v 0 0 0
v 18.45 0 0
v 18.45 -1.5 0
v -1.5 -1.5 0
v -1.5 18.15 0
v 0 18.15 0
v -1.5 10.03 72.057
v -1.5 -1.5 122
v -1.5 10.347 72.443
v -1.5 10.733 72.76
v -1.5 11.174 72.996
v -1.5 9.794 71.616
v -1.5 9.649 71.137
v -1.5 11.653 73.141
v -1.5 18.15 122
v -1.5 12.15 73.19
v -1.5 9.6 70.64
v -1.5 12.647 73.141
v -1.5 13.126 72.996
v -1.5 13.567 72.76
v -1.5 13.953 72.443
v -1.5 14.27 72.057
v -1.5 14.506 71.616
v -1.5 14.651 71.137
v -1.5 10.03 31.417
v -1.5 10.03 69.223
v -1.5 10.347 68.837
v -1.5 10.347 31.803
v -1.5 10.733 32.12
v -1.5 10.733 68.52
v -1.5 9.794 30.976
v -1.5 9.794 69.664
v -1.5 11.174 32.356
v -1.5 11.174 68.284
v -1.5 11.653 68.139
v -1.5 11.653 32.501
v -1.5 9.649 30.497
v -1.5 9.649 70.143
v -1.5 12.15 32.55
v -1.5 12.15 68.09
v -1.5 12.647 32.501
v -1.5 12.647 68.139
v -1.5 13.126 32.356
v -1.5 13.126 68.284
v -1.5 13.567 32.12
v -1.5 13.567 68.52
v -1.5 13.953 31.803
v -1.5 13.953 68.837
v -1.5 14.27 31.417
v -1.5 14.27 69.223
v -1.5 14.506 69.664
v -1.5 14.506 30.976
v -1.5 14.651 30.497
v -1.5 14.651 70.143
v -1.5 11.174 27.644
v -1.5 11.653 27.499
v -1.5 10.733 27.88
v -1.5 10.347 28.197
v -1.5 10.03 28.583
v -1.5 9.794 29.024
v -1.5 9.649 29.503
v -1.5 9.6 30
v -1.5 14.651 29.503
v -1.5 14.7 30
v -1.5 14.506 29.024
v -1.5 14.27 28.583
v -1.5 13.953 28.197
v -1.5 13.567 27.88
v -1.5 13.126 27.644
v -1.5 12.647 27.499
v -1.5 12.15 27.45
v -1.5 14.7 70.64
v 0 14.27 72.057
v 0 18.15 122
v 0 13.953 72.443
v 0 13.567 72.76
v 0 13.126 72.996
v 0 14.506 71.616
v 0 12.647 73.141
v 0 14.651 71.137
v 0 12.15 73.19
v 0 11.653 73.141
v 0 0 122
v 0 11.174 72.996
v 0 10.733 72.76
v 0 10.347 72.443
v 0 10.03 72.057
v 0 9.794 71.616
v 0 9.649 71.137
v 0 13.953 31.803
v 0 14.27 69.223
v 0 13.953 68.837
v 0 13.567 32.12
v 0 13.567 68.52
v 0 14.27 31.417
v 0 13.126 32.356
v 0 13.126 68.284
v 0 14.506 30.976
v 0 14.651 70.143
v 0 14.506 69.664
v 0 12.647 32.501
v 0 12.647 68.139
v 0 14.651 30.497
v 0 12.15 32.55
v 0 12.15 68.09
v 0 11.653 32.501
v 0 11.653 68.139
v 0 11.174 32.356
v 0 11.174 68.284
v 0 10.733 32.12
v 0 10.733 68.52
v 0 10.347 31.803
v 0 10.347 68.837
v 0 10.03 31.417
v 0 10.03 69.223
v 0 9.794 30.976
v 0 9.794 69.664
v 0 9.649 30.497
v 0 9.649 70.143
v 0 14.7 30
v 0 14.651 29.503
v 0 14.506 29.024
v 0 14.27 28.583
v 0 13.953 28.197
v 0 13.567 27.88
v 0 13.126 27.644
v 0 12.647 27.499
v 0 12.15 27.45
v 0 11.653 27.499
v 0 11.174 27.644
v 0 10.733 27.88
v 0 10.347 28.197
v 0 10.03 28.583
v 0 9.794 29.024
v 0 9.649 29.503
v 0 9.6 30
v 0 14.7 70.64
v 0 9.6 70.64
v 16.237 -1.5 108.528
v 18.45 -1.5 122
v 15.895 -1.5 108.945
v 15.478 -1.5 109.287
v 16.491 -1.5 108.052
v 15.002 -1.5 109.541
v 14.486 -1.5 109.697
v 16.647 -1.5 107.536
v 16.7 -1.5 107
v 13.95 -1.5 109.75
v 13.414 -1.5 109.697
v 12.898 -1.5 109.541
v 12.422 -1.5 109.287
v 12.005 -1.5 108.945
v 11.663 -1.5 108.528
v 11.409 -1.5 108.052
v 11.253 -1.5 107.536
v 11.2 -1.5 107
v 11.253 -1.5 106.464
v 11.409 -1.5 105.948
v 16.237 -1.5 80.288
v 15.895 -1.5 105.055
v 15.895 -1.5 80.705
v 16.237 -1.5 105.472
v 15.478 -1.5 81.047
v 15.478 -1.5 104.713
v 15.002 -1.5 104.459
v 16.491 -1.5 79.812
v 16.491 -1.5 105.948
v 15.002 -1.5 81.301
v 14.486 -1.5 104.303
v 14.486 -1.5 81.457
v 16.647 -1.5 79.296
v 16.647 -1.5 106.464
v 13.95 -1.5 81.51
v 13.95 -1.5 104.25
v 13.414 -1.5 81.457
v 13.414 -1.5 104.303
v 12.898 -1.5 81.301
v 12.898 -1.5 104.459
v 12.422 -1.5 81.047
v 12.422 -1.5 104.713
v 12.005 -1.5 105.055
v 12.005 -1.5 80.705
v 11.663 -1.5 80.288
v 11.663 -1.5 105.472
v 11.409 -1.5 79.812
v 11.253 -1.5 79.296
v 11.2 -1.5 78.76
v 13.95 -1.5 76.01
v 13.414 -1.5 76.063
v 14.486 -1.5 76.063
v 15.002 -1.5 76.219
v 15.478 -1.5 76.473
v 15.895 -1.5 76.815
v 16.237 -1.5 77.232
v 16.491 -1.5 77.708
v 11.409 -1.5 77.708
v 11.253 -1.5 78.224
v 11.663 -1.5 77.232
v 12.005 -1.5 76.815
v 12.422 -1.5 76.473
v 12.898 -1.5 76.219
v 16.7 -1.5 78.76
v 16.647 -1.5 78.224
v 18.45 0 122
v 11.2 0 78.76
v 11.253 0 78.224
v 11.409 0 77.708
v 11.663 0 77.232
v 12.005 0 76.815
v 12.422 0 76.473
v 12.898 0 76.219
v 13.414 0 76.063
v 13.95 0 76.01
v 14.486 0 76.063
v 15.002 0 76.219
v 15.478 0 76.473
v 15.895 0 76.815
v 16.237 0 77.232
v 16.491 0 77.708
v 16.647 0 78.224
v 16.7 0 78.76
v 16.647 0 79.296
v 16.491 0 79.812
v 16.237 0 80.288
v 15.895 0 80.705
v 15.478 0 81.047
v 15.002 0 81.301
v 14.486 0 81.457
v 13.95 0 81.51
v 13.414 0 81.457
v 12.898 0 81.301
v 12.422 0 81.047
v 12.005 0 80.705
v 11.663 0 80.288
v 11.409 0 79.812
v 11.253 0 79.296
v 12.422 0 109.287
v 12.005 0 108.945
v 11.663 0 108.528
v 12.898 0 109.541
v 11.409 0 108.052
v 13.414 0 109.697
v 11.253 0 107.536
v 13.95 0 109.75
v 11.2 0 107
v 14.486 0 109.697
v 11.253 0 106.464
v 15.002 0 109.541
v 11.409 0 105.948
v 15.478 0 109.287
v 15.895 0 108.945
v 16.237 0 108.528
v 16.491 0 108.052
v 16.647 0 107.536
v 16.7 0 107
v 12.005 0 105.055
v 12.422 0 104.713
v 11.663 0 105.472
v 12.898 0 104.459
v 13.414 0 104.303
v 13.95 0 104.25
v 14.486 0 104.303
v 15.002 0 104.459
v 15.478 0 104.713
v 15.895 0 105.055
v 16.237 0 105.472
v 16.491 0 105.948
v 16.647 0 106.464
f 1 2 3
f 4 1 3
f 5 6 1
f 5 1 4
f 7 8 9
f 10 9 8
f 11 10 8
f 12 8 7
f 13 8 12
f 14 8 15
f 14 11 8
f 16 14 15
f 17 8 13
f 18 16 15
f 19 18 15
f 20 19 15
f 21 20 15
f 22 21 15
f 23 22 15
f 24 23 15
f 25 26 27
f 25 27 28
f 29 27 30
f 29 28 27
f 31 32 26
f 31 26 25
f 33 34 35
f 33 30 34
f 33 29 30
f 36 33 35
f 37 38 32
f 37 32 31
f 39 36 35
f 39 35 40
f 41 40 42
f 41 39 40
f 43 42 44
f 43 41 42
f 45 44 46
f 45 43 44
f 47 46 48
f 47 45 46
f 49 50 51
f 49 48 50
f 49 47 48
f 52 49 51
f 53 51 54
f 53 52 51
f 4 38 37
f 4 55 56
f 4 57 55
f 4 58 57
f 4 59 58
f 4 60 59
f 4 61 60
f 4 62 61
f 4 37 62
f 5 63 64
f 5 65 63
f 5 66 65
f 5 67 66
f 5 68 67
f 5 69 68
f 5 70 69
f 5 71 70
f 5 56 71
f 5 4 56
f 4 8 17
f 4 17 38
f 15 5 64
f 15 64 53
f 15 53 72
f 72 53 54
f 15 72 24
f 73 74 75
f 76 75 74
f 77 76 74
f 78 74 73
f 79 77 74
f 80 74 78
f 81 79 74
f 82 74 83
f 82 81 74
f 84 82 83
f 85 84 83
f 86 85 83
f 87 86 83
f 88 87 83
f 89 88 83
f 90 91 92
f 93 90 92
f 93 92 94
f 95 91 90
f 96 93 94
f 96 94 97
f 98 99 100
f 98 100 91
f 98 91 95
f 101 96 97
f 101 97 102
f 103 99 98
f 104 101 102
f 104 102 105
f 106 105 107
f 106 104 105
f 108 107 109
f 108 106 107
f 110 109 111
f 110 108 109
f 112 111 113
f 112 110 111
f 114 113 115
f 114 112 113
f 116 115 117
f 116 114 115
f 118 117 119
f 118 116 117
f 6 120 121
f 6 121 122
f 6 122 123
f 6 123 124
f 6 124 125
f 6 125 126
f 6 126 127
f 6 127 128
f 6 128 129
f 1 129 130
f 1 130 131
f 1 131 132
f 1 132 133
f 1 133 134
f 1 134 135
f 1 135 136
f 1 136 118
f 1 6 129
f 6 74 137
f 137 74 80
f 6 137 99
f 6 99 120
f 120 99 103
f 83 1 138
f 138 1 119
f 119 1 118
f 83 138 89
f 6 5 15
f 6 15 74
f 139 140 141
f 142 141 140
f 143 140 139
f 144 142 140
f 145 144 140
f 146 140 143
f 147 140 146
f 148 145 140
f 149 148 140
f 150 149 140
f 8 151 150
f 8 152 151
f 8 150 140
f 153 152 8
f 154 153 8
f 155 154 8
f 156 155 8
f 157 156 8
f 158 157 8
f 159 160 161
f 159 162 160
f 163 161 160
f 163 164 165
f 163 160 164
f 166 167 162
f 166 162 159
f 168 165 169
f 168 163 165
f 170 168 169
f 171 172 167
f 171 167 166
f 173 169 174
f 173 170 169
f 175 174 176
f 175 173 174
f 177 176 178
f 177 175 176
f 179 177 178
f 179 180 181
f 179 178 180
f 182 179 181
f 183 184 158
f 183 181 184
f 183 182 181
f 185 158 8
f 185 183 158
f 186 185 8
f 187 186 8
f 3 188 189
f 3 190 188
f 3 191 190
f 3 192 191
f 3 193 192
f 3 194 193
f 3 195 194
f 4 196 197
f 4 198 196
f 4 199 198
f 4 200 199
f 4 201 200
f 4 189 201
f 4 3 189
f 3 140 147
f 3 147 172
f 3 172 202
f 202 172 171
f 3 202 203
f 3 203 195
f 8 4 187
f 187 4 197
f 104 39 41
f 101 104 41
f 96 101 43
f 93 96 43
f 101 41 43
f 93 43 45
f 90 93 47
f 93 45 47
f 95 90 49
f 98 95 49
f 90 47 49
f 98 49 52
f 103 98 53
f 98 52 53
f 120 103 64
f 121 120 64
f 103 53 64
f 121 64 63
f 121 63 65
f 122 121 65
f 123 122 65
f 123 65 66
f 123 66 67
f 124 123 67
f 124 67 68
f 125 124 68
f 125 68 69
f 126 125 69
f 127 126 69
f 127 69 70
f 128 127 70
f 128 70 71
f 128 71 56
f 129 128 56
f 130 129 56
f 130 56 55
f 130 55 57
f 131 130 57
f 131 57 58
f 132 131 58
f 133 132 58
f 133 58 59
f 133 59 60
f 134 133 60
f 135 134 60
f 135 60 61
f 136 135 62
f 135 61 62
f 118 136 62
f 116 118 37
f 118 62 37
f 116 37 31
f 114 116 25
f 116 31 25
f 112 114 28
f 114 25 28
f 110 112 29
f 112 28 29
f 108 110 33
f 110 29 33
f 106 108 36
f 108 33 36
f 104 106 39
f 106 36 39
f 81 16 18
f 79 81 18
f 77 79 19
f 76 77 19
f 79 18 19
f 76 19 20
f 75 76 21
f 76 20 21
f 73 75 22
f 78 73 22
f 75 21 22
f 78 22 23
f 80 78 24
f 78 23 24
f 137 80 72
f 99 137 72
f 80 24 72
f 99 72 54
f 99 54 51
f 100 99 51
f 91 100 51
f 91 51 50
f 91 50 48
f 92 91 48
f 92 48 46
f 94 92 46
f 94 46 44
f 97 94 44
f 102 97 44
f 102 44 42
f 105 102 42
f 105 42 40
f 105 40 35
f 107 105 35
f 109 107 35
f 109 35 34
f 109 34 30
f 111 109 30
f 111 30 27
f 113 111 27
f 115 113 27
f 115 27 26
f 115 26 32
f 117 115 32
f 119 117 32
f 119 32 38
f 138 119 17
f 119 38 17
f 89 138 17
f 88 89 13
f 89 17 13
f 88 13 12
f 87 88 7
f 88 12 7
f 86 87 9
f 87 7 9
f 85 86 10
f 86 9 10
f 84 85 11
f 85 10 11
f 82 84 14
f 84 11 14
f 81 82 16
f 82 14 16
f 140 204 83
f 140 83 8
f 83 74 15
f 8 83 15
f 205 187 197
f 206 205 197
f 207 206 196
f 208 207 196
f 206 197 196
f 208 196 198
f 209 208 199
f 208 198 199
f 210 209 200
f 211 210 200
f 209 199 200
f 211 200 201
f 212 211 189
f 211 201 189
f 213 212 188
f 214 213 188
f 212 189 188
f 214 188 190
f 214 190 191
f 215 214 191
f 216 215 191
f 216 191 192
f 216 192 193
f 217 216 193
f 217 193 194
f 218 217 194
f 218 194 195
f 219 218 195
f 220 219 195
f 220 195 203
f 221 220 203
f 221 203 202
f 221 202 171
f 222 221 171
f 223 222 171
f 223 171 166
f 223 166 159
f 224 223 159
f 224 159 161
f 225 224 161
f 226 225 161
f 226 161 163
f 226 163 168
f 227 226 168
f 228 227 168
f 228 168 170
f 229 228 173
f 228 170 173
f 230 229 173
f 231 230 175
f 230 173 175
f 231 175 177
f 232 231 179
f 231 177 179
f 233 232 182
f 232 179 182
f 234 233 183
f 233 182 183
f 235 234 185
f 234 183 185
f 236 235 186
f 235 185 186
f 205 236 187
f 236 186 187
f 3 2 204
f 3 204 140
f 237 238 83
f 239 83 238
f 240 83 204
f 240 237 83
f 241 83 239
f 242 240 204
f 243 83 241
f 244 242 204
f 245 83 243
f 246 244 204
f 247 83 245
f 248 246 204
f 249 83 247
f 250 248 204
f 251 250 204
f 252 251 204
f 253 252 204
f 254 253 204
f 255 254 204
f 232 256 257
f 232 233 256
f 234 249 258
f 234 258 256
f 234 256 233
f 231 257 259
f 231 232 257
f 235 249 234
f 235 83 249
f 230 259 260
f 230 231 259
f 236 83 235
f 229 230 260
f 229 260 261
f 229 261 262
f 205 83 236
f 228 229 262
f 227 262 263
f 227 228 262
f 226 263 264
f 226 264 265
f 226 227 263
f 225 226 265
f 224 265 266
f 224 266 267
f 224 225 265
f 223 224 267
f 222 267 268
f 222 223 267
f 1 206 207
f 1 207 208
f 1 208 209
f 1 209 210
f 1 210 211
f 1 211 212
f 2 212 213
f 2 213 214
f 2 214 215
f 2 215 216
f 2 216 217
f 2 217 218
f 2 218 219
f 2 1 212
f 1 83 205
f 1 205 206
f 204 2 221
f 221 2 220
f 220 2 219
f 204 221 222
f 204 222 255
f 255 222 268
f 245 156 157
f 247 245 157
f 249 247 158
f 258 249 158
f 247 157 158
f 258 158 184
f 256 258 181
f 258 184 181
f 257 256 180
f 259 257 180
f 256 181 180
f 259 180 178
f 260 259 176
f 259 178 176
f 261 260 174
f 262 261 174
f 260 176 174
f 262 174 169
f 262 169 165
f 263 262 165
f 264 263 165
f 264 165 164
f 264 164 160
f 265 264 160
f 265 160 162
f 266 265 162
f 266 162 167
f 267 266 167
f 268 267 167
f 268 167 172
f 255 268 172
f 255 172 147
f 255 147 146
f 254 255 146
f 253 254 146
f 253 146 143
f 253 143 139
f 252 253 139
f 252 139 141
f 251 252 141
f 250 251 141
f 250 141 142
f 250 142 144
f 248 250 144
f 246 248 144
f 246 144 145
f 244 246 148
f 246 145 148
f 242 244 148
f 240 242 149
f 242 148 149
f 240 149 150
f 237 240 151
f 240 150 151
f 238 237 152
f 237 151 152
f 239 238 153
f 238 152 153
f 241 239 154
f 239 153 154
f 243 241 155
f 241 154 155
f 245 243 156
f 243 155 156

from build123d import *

# Parameters (mm, degrees)
BOSS_EXTRUDE1_DEPTH = 122
SKETCH2_R           = 2.75
CUT_EXTRUDE1_DEPTH  = 20.65
SKETCH3_R           = 2.55
CUT_EXTRUDE2_DEPTH  = 20.95


with BuildPart() as part:
    # Sketch1 → Boss-Extrude1 (new body)
    with BuildSketch(Plane.XY):
        Polygon((0, 18.15), (0, 0), (18.45, 0), (18.45, -1.5), (-1.5, -1.5), (-1.5, 18.15), align=None)
    extrude(amount=BOSS_EXTRUDE1_DEPTH)

    # Sketch2 → Cut-Extrude1 (cut, through all)
    with BuildSketch(Plane(origin=(0, -1.5, 0), x_dir=(-1, 0, 0), z_dir=(0, -1, 0))):
        with Locations((-13.95, -107)):
            Circle(SKETCH2_R)
        with Locations((-13.95, -78.76)):
            Circle(SKETCH2_R)
    extrude(amount=-CUT_EXTRUDE1_DEPTH, mode=Mode.SUBTRACT)

    # Sketch3 → Cut-Extrude2 (cut, through all)
    with BuildSketch(Plane.ZY.offset(1.5)):
        with Locations((30, 12.15)):
            Circle(SKETCH3_R)
        with Locations((70.64, 12.15)):
            Circle(SKETCH3_R)
    extrude(amount=-CUT_EXTRUDE2_DEPTH, mode=Mode.SUBTRACT)


solid = part.part
